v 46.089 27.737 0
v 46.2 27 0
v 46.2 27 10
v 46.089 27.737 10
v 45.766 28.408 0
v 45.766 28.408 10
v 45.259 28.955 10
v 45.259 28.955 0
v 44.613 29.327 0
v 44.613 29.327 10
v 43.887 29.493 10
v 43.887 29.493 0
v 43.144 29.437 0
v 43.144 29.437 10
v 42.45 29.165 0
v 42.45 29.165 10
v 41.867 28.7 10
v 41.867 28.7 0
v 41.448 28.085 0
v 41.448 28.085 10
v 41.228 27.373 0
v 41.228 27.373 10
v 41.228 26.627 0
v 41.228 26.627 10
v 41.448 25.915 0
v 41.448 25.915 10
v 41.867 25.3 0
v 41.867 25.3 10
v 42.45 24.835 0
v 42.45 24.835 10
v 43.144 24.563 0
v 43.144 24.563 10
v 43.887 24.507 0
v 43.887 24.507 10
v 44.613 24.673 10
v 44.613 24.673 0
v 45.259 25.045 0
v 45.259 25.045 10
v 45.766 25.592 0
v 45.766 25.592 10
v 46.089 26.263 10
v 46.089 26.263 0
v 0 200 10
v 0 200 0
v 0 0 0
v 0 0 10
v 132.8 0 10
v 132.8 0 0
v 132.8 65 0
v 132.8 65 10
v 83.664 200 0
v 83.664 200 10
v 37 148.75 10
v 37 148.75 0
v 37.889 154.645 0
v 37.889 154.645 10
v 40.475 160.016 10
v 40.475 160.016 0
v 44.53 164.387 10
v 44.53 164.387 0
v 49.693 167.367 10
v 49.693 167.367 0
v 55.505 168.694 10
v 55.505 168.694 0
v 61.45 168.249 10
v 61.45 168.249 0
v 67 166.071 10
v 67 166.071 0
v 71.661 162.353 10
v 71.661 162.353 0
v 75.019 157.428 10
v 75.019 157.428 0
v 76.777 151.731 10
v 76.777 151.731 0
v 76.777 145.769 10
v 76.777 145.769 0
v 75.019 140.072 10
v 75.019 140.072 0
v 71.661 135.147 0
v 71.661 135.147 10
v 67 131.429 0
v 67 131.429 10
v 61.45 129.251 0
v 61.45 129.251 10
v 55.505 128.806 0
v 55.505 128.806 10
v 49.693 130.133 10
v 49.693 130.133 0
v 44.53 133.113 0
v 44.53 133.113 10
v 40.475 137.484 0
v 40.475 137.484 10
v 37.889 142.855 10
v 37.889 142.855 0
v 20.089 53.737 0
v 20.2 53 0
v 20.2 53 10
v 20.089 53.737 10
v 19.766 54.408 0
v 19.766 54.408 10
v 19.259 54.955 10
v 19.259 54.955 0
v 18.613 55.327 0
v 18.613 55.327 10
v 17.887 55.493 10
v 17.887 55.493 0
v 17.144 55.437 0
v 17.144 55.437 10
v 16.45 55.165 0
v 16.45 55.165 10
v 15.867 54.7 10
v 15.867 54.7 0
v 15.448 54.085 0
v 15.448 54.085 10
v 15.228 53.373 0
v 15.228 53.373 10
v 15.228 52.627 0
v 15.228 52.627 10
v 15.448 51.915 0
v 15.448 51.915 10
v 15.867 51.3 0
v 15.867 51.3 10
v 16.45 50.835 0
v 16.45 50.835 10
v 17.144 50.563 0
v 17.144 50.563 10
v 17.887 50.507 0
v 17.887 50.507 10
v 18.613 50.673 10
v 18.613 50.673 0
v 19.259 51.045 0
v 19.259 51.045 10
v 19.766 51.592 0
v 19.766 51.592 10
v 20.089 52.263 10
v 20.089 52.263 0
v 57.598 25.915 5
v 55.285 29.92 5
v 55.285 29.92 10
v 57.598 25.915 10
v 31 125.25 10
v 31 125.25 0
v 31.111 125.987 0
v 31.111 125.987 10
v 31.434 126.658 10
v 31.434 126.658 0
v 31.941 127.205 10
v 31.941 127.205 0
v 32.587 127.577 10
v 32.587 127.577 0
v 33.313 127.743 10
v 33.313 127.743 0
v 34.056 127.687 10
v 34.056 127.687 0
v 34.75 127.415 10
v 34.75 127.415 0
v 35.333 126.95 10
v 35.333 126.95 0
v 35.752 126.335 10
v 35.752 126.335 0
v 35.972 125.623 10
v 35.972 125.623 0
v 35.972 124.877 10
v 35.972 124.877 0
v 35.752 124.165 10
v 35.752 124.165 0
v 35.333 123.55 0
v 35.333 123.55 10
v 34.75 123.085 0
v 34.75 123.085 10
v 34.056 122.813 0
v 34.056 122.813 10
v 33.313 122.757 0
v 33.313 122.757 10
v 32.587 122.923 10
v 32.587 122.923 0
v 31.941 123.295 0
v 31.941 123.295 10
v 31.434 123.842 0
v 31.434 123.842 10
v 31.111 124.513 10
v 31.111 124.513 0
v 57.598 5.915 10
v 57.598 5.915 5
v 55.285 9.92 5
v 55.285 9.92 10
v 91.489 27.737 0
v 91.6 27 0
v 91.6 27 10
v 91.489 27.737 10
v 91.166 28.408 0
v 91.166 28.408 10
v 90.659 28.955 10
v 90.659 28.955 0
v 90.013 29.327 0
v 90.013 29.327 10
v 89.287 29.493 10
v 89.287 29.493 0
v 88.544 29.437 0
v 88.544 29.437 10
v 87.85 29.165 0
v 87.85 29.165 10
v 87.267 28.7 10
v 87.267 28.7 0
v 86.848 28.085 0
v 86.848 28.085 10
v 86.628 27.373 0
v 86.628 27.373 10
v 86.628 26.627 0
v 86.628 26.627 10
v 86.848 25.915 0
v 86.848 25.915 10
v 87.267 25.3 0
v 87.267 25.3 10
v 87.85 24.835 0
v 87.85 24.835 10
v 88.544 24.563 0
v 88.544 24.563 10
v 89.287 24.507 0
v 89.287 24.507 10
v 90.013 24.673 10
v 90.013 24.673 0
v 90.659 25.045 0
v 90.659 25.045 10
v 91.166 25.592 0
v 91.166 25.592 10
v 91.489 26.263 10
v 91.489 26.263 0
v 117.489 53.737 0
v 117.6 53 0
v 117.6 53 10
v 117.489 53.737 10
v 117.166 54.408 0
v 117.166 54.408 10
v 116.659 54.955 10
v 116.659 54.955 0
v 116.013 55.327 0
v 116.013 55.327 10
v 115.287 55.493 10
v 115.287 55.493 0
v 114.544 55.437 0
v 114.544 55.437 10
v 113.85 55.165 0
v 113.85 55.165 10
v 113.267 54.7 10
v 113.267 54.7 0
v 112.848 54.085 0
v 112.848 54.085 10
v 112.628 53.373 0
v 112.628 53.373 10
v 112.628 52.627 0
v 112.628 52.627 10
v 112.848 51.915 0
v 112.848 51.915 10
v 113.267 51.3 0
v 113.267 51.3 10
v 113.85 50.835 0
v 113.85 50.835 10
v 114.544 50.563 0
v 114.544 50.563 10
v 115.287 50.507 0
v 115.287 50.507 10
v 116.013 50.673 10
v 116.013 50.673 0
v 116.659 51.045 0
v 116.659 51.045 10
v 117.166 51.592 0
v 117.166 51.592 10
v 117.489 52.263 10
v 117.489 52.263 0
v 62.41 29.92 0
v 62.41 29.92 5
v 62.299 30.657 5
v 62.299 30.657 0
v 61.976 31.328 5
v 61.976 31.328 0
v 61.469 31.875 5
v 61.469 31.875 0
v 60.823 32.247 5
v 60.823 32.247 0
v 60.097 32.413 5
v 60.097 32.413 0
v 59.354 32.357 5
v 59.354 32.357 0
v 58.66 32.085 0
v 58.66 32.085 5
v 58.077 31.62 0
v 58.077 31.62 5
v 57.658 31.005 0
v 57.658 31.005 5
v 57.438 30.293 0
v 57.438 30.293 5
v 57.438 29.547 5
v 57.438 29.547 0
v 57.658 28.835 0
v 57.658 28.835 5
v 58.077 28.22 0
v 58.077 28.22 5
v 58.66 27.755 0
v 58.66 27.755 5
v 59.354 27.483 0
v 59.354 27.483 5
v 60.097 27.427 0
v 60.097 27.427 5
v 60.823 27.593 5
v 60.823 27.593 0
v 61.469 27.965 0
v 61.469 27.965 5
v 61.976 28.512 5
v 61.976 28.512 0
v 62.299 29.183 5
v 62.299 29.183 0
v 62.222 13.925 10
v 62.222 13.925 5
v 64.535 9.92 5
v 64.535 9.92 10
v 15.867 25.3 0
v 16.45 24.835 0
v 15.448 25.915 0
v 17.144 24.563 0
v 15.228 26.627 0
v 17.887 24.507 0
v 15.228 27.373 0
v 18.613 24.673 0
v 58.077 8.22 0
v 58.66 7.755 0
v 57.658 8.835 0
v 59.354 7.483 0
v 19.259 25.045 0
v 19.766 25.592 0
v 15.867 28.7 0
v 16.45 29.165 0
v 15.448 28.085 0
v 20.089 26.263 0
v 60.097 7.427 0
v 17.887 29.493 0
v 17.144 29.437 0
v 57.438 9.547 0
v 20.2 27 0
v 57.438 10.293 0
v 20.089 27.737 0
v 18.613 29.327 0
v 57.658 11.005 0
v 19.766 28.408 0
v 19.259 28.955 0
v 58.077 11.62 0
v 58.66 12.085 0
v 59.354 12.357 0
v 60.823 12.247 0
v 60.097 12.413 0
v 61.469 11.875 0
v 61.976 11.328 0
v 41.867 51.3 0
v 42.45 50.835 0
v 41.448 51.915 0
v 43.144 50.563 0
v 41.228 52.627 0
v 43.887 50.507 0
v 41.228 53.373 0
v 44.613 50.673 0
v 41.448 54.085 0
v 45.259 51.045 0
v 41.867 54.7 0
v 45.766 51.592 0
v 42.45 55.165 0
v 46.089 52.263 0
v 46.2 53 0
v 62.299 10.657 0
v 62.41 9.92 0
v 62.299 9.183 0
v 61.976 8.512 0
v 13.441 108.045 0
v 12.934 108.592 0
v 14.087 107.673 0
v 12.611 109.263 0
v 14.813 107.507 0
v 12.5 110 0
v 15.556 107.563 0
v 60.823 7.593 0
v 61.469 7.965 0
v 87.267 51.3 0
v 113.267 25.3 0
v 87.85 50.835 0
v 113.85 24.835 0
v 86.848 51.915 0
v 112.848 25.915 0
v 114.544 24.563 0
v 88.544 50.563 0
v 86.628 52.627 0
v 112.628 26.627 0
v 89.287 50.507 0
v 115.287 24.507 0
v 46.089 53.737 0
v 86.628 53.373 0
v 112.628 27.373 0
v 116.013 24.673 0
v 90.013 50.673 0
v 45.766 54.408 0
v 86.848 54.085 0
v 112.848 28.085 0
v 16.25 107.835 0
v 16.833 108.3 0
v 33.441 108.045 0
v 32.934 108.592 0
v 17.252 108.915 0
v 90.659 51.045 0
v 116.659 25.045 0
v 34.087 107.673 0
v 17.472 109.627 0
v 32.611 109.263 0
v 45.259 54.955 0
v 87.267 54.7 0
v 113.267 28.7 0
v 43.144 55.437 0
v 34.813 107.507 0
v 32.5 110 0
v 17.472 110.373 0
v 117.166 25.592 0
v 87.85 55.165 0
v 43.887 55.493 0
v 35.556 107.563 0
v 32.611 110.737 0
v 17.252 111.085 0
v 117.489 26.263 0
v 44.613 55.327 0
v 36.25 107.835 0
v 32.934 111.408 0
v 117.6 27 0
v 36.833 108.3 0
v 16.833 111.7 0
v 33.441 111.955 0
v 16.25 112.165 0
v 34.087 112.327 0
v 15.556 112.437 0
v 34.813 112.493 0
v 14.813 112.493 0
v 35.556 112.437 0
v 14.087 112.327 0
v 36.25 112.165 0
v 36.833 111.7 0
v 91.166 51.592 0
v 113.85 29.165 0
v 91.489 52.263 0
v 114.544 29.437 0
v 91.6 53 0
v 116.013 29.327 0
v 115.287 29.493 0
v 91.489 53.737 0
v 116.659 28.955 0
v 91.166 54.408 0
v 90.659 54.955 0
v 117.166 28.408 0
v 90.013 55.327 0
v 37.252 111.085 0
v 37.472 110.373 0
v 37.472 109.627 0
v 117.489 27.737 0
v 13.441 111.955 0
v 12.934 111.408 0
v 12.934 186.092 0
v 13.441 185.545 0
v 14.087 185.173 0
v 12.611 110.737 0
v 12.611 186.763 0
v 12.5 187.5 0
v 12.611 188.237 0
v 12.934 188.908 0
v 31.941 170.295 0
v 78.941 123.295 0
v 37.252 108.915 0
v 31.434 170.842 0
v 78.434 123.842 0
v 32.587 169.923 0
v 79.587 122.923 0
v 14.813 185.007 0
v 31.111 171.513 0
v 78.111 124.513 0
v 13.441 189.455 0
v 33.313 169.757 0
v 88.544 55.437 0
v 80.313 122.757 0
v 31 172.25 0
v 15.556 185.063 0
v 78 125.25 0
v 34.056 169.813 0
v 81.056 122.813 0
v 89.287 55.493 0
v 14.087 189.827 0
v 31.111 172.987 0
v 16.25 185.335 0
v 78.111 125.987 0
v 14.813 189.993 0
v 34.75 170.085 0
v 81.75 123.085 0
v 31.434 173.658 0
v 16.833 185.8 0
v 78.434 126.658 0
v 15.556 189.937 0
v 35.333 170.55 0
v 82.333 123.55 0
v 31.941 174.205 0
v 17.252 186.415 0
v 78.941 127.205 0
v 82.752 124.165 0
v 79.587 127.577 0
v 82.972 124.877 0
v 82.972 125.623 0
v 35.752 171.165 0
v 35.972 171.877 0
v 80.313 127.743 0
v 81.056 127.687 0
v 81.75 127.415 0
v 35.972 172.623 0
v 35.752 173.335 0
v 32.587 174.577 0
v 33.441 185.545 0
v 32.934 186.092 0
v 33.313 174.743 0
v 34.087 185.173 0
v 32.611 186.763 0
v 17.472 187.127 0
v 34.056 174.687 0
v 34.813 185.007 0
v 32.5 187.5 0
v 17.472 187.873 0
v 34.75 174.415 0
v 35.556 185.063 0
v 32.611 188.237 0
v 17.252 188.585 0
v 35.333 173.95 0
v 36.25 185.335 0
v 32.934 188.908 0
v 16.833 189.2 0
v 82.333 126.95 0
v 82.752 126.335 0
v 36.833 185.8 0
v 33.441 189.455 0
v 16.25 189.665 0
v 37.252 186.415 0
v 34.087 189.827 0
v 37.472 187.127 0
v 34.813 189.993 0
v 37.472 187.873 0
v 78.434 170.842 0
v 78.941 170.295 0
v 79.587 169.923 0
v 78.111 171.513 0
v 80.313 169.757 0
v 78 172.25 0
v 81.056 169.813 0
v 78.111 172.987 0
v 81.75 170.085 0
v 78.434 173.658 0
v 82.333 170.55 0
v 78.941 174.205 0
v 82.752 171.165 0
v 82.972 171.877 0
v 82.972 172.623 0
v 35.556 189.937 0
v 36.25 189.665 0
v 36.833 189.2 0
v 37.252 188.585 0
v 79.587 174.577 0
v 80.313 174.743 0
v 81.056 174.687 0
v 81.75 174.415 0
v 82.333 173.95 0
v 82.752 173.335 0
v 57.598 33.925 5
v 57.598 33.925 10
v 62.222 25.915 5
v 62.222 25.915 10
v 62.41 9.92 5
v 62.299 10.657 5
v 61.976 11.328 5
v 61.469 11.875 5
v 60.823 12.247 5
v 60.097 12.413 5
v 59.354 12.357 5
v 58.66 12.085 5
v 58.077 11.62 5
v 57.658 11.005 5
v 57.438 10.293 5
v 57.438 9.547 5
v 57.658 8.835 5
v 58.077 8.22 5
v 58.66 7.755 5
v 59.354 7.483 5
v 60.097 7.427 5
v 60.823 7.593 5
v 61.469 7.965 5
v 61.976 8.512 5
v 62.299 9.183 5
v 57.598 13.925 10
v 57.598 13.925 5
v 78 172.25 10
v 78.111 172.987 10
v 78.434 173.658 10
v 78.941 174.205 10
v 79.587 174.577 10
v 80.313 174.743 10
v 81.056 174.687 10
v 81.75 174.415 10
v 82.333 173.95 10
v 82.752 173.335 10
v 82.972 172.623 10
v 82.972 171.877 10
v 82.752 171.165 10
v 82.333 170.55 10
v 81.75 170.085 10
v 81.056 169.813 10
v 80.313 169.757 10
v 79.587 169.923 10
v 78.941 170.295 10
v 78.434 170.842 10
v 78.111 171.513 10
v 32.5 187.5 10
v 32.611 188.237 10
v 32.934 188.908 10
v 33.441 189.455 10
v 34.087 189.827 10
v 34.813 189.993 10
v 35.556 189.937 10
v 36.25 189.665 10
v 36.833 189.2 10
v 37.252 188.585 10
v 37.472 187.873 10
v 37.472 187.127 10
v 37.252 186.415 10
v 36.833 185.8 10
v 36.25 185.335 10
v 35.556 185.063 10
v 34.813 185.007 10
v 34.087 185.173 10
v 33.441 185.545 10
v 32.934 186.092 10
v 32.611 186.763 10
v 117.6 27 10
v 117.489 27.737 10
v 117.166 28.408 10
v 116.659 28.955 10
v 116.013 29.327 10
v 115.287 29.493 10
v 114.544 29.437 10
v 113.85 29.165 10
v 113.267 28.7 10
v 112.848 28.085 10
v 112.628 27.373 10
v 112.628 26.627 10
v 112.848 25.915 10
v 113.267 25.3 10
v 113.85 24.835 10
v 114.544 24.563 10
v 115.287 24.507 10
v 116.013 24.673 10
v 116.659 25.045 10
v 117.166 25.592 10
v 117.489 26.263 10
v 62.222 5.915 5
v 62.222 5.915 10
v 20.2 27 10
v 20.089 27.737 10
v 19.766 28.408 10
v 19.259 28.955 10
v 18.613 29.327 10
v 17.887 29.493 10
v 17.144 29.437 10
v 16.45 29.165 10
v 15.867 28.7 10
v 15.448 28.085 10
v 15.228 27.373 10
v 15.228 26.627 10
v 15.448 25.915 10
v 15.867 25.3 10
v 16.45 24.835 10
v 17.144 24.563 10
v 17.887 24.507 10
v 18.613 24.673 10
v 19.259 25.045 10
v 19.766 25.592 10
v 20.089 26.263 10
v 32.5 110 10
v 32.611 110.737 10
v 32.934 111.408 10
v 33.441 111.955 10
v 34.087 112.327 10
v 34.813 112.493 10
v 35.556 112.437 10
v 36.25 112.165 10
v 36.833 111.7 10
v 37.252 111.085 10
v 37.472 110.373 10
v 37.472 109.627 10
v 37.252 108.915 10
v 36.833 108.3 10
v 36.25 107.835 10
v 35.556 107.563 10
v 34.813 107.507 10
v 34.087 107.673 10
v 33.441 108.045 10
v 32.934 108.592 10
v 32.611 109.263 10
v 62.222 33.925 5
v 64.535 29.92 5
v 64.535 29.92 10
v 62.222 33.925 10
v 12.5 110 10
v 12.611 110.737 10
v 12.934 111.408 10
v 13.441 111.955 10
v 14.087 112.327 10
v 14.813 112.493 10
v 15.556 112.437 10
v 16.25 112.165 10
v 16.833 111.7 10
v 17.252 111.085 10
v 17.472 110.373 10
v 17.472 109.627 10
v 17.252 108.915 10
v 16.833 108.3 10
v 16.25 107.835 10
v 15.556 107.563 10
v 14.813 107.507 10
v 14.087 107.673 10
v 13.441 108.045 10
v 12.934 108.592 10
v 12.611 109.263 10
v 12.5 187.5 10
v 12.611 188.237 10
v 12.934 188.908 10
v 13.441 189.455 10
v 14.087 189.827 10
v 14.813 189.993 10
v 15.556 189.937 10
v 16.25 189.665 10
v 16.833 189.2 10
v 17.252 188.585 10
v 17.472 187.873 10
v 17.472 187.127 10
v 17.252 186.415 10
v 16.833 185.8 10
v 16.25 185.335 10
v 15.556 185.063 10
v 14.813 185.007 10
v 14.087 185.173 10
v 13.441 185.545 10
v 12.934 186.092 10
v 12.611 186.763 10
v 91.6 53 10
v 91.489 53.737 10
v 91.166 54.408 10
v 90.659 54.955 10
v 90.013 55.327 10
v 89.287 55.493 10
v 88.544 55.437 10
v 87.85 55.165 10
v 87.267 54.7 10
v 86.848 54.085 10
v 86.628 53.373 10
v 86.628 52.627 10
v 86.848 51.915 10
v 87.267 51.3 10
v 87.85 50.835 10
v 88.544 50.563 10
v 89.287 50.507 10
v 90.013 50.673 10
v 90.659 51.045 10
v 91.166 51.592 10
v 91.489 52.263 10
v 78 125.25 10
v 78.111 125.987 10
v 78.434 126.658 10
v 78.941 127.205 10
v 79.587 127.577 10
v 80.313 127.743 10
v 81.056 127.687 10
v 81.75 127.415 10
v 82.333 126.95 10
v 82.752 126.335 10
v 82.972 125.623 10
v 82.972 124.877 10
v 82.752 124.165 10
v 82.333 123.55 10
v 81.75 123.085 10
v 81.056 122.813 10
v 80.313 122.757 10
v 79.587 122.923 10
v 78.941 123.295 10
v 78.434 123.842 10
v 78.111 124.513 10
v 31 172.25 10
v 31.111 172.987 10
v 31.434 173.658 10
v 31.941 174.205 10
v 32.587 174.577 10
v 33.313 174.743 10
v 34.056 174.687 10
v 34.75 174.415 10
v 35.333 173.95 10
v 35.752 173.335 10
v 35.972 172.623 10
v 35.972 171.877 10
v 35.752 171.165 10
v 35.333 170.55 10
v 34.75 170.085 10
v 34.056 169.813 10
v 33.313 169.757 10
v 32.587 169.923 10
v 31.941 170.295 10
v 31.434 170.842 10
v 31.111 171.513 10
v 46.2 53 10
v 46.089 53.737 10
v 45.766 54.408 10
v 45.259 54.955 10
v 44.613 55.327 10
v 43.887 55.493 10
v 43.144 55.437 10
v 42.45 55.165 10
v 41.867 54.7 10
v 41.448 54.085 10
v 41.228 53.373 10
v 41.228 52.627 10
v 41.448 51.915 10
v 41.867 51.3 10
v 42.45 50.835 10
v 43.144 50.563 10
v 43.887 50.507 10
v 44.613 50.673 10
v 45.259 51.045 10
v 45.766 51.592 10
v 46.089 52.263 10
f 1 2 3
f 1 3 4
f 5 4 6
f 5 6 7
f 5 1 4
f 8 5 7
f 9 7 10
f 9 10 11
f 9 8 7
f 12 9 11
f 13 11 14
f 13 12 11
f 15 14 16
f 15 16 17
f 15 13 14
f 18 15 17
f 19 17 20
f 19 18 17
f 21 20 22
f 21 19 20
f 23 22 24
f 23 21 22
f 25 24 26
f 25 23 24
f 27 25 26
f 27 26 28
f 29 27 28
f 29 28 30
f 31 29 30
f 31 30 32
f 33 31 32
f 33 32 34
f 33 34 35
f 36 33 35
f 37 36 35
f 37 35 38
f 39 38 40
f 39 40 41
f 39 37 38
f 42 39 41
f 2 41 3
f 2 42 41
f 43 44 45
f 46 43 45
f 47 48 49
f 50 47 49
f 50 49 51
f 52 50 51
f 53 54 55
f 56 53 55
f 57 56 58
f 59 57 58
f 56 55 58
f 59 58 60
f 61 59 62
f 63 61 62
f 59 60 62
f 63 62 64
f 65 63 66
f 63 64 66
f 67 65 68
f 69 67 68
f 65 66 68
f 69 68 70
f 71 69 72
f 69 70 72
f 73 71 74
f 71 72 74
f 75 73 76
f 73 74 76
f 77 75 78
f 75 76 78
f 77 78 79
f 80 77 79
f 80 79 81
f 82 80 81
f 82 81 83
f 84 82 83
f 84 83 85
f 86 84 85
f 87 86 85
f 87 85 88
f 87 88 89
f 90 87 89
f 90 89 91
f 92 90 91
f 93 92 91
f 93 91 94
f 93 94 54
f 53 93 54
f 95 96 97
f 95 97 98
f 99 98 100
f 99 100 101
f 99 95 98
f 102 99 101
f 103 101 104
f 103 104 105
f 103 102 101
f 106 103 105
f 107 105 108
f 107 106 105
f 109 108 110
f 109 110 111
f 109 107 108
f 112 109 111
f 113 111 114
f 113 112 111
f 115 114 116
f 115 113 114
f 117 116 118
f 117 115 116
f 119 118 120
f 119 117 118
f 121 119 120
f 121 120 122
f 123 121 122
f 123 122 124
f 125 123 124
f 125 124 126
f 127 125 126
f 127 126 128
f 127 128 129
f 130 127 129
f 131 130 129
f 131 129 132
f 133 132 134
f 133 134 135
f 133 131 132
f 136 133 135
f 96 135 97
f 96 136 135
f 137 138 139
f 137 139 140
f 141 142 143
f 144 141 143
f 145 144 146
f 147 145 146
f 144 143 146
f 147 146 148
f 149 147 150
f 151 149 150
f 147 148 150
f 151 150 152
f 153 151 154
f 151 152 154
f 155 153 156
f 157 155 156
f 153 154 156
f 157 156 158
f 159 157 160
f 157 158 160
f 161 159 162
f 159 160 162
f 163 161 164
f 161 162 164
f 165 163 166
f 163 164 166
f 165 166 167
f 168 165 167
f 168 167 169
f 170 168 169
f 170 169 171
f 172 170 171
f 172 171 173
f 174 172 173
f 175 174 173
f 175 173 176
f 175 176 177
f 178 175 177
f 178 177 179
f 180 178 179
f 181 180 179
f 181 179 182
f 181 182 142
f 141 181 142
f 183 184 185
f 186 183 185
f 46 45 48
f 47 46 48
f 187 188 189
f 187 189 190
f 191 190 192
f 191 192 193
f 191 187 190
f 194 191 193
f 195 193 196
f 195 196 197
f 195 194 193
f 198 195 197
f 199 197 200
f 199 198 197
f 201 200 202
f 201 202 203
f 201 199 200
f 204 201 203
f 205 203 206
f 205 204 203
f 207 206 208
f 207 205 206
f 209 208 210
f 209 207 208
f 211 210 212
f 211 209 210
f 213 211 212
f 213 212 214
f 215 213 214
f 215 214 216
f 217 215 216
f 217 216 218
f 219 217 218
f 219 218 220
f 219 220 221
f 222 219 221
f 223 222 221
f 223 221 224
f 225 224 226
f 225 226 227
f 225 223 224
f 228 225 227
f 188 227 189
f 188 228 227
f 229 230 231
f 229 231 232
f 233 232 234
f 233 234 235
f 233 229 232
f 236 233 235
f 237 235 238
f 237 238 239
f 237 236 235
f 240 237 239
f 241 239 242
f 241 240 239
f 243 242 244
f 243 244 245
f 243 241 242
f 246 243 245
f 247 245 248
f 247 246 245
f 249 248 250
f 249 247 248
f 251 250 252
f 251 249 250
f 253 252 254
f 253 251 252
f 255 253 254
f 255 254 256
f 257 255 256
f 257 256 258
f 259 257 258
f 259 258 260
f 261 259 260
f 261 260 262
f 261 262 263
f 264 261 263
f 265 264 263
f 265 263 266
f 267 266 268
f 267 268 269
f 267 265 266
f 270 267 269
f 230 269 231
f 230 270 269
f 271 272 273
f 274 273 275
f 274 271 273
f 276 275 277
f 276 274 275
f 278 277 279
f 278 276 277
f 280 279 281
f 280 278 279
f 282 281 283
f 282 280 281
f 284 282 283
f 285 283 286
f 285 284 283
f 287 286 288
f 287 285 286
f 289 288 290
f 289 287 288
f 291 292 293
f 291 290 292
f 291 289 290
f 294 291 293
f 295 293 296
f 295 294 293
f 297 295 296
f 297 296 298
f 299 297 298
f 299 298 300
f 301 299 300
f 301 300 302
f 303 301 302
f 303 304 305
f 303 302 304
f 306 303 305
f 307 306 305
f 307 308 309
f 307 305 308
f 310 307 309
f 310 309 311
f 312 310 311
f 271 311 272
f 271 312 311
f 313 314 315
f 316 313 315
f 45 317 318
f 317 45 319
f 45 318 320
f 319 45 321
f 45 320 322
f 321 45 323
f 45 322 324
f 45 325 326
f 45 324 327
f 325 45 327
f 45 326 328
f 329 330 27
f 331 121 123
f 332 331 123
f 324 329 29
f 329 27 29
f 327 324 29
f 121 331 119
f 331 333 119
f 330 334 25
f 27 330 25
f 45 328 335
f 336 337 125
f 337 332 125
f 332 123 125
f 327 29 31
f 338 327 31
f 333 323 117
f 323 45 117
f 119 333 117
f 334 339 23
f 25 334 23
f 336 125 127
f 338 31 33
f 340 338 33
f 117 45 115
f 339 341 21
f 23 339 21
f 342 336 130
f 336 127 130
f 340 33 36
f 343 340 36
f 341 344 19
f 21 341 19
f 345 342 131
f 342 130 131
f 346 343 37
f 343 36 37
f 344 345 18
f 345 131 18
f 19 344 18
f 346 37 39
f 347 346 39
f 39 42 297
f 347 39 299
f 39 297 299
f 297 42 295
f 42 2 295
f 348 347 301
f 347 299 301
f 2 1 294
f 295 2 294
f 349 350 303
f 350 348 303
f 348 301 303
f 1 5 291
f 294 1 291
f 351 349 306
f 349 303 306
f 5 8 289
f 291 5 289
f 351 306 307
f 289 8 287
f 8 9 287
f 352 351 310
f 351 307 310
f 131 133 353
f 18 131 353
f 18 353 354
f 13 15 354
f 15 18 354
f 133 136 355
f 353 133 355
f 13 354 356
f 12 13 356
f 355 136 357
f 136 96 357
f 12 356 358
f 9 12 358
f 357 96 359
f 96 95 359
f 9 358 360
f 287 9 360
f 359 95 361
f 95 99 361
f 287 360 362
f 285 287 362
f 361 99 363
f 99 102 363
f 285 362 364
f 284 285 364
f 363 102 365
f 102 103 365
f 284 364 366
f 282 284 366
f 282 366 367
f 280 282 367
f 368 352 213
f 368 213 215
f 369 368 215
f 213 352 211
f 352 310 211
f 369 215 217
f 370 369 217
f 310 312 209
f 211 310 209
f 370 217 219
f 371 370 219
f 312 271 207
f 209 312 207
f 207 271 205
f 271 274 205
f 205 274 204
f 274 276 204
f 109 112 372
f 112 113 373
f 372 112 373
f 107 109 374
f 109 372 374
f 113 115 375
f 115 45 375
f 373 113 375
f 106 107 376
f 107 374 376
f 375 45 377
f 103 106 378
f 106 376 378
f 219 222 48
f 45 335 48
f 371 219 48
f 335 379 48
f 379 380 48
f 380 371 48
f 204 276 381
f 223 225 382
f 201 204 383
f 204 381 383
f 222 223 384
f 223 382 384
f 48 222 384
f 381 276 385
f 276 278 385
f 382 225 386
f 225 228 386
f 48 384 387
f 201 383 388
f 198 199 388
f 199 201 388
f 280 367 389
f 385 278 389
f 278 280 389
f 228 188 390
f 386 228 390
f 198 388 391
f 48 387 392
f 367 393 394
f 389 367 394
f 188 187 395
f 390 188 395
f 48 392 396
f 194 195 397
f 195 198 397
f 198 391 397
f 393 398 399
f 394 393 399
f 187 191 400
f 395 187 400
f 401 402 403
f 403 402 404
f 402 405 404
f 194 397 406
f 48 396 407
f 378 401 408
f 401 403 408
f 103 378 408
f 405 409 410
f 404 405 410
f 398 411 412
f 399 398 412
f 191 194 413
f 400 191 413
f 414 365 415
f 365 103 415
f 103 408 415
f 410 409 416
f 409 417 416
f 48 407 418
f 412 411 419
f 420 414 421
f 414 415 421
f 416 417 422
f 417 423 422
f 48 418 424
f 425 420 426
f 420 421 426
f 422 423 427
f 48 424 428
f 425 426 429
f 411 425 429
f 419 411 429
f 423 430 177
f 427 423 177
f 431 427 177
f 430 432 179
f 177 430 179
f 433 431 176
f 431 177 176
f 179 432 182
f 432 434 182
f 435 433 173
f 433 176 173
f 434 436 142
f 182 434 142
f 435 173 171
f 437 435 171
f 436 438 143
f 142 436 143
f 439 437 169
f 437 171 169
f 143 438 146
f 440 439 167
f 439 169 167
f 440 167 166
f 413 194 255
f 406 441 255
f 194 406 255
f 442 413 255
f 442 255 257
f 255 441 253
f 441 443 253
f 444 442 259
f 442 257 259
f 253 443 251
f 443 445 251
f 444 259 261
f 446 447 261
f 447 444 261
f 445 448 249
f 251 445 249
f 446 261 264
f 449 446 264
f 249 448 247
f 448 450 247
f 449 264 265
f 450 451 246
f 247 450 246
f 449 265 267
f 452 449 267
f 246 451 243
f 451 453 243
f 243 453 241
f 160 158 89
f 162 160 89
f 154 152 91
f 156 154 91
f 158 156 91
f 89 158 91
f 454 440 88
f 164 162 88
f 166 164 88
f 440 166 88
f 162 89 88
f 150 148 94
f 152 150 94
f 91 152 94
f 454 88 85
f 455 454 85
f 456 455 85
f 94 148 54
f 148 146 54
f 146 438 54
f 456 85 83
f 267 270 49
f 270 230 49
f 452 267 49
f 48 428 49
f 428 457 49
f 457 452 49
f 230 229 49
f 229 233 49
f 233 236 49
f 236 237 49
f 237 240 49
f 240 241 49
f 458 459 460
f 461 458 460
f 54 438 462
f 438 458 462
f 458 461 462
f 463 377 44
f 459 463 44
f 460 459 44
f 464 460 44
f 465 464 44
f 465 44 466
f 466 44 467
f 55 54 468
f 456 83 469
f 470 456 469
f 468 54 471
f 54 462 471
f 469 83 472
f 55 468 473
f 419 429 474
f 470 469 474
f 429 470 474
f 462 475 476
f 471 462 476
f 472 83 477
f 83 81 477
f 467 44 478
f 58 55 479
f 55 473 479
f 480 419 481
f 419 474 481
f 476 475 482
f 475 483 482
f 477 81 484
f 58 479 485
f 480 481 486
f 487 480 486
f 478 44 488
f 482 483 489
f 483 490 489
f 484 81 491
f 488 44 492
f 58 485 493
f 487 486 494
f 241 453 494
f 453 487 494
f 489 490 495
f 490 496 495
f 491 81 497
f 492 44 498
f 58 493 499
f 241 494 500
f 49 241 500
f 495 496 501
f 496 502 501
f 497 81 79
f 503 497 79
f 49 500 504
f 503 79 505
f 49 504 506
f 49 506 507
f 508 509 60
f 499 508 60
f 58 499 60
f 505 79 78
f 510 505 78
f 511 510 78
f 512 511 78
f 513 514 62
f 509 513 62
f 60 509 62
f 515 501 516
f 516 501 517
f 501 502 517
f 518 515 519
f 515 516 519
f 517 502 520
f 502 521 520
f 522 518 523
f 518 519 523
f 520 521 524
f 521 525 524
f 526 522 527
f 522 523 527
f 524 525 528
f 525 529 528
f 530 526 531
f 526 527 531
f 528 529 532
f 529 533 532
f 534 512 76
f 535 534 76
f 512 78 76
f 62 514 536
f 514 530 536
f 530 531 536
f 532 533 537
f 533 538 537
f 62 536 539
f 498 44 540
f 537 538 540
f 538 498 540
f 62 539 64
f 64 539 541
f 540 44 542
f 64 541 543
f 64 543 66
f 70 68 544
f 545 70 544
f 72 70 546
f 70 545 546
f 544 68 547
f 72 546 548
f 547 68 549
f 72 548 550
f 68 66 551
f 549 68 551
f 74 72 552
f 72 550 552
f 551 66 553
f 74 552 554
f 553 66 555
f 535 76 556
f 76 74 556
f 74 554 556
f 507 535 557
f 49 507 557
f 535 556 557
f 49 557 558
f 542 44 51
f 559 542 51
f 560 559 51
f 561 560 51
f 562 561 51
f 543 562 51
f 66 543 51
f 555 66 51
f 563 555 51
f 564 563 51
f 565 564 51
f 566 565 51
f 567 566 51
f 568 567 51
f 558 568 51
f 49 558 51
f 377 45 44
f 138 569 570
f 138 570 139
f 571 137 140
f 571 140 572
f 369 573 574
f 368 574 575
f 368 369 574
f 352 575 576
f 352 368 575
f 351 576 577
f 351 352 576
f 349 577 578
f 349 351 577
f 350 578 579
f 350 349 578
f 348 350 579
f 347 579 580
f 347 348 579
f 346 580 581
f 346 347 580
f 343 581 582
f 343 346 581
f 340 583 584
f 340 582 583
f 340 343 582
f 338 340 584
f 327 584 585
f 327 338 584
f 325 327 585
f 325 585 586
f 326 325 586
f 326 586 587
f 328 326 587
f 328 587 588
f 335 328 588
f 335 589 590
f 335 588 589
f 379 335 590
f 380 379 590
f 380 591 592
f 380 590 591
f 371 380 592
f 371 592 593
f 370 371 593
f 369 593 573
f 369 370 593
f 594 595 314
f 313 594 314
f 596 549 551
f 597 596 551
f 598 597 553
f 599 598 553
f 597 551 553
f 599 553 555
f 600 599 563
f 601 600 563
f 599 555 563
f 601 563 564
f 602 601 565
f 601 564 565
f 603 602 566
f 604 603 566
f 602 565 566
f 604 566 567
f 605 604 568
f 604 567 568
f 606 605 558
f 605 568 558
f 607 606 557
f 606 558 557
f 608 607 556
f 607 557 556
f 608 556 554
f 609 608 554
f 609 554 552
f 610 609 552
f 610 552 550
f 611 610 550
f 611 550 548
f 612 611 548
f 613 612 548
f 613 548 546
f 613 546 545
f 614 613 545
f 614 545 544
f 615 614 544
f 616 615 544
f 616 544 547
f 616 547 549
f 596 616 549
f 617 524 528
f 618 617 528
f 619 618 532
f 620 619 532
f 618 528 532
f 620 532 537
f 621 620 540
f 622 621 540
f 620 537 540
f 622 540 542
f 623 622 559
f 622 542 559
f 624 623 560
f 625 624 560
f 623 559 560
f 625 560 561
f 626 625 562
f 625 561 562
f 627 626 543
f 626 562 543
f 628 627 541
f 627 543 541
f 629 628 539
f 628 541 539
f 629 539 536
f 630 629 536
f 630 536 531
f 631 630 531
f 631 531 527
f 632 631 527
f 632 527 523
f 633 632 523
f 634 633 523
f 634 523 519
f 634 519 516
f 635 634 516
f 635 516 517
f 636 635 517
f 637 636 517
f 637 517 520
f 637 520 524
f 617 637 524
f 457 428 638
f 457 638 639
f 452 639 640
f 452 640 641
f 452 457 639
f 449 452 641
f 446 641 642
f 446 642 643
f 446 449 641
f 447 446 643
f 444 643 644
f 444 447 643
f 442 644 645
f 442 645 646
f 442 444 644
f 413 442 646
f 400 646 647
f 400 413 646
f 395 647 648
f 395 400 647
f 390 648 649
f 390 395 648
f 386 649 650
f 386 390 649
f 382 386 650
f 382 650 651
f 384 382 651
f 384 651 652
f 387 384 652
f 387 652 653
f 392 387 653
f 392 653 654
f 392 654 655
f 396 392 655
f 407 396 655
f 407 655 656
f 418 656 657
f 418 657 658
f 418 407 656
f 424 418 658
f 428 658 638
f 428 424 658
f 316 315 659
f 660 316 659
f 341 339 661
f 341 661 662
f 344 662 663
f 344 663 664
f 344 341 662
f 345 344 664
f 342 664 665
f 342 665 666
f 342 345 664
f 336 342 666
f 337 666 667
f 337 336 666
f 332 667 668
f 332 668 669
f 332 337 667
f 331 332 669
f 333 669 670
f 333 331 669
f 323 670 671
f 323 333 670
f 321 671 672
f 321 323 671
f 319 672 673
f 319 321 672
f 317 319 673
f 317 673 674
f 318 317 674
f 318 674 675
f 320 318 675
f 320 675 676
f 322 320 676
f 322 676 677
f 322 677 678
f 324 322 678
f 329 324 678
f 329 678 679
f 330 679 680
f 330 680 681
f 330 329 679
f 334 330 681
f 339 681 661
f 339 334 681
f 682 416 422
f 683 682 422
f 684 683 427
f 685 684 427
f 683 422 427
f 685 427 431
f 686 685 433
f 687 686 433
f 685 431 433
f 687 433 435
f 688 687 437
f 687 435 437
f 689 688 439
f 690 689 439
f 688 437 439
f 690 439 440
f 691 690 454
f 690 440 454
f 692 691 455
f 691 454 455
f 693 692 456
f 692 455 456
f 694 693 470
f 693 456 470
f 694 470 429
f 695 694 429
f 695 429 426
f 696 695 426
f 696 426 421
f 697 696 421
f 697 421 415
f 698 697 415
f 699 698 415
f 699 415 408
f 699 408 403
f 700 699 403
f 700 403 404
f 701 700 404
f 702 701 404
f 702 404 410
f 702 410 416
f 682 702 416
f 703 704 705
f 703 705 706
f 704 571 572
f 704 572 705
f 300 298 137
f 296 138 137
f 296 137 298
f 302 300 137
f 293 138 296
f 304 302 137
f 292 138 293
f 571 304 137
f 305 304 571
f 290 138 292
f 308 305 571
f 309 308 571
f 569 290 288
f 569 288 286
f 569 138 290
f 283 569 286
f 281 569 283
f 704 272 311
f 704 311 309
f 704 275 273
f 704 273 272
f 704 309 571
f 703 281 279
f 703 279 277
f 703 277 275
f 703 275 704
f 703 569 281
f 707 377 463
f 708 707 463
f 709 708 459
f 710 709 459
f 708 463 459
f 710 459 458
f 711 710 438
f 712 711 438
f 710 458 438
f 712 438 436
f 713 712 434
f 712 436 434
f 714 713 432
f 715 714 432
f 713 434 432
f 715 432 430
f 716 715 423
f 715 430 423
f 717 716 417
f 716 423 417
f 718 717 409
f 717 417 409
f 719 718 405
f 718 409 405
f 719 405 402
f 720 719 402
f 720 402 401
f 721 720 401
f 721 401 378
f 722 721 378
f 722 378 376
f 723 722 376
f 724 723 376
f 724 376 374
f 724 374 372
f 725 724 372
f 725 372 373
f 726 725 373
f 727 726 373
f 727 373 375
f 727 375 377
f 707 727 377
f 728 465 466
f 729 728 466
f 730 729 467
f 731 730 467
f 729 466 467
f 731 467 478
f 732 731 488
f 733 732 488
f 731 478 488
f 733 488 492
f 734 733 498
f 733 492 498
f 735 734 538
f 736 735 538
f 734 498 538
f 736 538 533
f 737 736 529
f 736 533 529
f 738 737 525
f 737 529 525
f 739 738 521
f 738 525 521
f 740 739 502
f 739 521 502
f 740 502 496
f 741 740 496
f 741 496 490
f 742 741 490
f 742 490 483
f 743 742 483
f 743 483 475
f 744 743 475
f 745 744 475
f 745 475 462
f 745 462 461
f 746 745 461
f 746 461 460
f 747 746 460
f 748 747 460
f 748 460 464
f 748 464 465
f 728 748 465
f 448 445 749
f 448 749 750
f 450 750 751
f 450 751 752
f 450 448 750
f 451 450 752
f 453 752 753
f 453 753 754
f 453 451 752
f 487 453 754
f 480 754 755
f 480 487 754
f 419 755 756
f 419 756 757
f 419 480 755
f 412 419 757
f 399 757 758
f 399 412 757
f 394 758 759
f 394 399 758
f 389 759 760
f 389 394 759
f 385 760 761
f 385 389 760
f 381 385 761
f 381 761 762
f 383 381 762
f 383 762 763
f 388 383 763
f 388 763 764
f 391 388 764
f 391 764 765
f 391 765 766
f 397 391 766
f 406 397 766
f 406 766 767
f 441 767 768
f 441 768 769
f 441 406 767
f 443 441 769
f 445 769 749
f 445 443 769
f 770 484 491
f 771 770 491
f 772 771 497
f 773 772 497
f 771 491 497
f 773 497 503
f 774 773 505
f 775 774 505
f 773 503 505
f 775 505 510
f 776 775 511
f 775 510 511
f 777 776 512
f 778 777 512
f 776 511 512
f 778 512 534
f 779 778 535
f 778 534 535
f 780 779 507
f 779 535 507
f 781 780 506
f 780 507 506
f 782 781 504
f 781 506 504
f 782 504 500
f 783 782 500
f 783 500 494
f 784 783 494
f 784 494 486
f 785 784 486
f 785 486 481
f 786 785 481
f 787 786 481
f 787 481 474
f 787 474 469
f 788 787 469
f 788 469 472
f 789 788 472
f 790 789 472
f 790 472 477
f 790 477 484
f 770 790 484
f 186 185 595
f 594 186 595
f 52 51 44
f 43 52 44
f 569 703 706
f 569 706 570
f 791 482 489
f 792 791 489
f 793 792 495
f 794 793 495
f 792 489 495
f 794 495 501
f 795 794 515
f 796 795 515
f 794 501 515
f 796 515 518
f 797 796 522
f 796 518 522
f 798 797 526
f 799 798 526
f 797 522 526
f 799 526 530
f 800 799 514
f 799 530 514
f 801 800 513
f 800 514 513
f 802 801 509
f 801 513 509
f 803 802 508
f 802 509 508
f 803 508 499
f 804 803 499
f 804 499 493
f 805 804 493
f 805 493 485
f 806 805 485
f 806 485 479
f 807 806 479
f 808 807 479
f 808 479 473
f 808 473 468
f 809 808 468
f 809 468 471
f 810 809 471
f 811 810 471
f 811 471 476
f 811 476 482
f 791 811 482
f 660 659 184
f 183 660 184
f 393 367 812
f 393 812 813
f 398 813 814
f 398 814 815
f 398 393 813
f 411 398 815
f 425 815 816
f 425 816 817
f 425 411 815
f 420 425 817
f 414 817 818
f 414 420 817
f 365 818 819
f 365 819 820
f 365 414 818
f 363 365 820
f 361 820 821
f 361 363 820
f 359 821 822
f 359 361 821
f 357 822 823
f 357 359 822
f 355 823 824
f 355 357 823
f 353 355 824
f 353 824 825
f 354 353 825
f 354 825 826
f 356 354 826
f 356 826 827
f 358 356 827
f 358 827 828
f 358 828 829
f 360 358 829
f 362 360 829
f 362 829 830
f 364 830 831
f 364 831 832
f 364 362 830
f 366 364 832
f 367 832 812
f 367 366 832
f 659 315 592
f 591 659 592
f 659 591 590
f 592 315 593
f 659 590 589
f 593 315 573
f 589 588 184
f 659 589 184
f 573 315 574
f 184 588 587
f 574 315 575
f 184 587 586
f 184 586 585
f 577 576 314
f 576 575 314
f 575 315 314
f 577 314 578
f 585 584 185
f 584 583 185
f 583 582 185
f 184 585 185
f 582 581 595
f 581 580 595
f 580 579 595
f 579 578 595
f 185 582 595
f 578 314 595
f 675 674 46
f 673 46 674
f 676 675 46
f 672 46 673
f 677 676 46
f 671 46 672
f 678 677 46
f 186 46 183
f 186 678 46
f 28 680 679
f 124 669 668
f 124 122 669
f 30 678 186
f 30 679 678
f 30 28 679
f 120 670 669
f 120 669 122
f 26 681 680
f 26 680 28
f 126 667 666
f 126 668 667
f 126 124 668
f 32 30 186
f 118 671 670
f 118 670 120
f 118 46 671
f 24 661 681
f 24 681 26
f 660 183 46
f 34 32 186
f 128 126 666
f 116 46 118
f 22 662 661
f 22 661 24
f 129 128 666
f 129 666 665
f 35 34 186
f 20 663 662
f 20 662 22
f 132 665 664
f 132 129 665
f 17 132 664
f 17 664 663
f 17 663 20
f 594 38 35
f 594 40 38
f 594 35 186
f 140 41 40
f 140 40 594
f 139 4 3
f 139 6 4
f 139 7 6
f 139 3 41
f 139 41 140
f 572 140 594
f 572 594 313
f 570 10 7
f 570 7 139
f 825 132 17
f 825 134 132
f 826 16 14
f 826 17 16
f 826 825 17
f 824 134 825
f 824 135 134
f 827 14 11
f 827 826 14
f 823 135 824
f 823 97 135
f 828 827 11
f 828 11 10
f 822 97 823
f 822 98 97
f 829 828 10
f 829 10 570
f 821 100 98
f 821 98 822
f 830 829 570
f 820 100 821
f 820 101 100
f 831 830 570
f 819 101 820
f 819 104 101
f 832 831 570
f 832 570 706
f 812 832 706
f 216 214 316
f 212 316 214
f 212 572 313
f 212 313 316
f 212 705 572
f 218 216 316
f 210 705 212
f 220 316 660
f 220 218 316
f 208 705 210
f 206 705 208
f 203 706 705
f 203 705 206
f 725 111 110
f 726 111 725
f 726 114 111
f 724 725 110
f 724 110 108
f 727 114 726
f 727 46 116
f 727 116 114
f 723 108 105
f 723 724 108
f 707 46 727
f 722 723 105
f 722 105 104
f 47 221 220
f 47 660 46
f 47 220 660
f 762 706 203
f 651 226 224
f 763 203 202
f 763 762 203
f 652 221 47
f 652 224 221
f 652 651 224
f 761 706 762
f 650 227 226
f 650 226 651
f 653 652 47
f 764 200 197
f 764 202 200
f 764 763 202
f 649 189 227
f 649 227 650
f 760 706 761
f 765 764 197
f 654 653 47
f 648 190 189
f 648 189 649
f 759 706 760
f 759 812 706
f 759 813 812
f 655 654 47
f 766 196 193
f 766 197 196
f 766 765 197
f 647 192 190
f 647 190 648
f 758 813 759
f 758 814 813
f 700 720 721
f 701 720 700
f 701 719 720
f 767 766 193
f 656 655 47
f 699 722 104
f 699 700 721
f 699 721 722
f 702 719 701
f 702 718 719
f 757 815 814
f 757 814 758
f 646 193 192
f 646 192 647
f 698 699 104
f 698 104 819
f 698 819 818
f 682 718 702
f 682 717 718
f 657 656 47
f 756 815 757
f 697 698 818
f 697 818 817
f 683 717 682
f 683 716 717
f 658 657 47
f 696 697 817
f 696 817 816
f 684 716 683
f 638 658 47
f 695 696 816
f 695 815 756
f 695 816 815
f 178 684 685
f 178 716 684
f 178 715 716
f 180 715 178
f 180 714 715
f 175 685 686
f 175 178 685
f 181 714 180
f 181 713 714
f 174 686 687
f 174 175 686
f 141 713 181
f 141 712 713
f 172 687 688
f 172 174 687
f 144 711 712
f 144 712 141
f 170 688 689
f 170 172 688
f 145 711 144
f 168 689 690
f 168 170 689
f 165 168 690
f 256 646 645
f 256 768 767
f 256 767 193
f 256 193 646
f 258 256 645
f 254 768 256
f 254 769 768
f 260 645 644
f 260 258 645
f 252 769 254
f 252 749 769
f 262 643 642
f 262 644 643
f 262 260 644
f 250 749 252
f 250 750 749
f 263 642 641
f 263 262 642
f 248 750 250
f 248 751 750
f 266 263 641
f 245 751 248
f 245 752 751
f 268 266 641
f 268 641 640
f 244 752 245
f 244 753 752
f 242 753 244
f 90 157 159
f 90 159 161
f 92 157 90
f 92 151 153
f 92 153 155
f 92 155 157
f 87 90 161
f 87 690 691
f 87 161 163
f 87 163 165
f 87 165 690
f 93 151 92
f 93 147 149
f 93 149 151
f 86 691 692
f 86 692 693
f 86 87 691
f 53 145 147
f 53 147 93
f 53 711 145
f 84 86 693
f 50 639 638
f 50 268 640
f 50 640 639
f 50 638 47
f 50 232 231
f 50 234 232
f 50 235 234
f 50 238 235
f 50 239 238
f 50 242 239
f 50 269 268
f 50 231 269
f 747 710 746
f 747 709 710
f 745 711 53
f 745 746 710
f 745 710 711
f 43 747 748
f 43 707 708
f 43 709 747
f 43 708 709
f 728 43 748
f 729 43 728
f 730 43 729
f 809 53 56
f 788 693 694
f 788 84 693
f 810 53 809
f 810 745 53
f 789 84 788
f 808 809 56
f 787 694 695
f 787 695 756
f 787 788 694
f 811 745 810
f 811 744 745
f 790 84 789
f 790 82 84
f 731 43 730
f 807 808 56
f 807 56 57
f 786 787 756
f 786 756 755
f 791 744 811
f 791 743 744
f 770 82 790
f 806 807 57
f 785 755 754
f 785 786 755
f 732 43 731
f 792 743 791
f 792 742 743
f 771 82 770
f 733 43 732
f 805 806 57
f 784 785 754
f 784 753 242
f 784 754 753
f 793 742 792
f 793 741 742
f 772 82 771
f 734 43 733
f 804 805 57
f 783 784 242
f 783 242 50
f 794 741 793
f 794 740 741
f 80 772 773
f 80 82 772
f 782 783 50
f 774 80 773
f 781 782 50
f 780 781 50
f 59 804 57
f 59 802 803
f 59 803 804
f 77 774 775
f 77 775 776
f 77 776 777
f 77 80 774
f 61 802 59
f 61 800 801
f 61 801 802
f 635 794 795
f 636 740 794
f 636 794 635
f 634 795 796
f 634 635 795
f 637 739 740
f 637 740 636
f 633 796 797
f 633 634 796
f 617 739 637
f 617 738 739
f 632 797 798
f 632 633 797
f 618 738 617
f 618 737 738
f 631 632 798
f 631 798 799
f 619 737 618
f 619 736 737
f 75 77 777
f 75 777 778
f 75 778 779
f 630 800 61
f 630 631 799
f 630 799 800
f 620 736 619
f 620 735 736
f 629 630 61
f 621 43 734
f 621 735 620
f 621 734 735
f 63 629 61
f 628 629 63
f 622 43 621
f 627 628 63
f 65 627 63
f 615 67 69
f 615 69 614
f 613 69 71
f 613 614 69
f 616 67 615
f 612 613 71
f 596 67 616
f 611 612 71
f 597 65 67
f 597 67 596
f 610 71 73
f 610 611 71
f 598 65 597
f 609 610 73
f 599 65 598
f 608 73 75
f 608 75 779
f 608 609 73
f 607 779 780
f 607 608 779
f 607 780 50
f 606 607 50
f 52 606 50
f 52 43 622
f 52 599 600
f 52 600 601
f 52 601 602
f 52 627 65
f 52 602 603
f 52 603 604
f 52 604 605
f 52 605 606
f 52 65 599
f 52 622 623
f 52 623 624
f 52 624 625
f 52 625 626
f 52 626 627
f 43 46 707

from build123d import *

# Parameters (mm, degrees)
SKETCH1_R           = 2.5
BOSS_EXTRUDE1_DEPTH = 10
CUT_EXTRUDE1_START  = 5
SKETCH1_3_R         = 2.5
CUT_EXTRUDE1_DEPTH  = 5
SKETCH4_R           = 2.5
SKETCH4_R_2         = 20
CUT_EXTRUDE2_DEPTH  = 241.282833344


with BuildPart() as part:
    # Sketch1 → Boss-Extrude1 (new body)
    with BuildSketch(Plane.XY):
        Polygon((0, 200), (0, 0), (132.8, 0), (132.8, 65), (83.664018374, 200), align=None)
        with Locations((17.7, 27)):
            Circle(SKETCH1_R, mode=Mode.SUBTRACT)
        with Locations((43.7, 27)):
            Circle(SKETCH1_R, mode=Mode.SUBTRACT)
        with Locations((17.7, 53)):
            Circle(SKETCH1_R, mode=Mode.SUBTRACT)
        with Locations((43.7, 53)):
            Circle(SKETCH1_R, mode=Mode.SUBTRACT)
        with Locations((89.1, 27)):
            Circle(SKETCH1_R, mode=Mode.SUBTRACT)
        with Locations((115.1, 27)):
            Circle(SKETCH1_R, mode=Mode.SUBTRACT)
        with Locations((89.1, 53)):
            Circle(SKETCH1_R, mode=Mode.SUBTRACT)
        with Locations((115.1, 53)):
            Circle(SKETCH1_R, mode=Mode.SUBTRACT)
        with Locations((59.91, 9.92)):
            Circle(SKETCH1_R, mode=Mode.SUBTRACT)
        with Locations((59.91, 29.92)):
            Circle(SKETCH1_R, mode=Mode.SUBTRACT)
    extrude(amount=BOSS_EXTRUDE1_DEPTH)

    # Sketch1<3> → Cut-Extrude1 (cut)
    # profile 1 of 2: a face of its own
    with BuildSketch(Plane.XY.offset(CUT_EXTRUDE1_START)):
        Polygon((62.2225, 25.914632507), (64.535, 29.92), (62.2225, 33.925367493), (57.5975, 33.925367493), (55.285, 29.92), (57.5975, 25.914632507), align=None)
        with Locations((59.91, 29.92)):
            Circle(SKETCH1_3_R, mode=Mode.SUBTRACT)
    # profile 2 of 2: a face of its own
    with BuildSketch(Plane.XY.offset(CUT_EXTRUDE1_START)):
        Polygon((64.535, 9.92), (62.2225, 13.925367493), (57.5975, 13.925367493), (55.285, 9.92), (57.5975, 5.914632507), (62.2225, 5.914632507), align=None)
        with Locations((59.91, 9.92)):
            Circle(SKETCH1_3_R, mode=Mode.SUBTRACT)
    extrude(amount=CUT_EXTRUDE1_DEPTH, mode=Mode.SUBTRACT)

    # Sketch4 → Cut-Extrude2 (cut, through all)
    with BuildSketch(Plane(origin=(0, 0, 0), x_dir=(-1, 0, 0), z_dir=(0, 0, -1))):
        with Locations((-15, 187.5)):
            Circle(SKETCH4_R)
        with Locations((-35, 187.5)):
            Circle(SKETCH4_R)
        with Locations((-35, 110)):
            Circle(SKETCH4_R)
        with Locations((-15, 110)):
            Circle(SKETCH4_R)
        with Locations((-57, 148.75)):
            Circle(SKETCH4_R_2)
        with Locations((-33.5, 172.25)):
            Circle(SKETCH4_R)
        with Locations((-33.5, 125.25)):
            Circle(SKETCH4_R)
        with Locations((-80.5, 125.25)):
            Circle(SKETCH4_R)
        with Locations((-80.5, 172.25)):
            Circle(SKETCH4_R)
    extrude(amount=-CUT_EXTRUDE2_DEPTH, mode=Mode.SUBTRACT)


solid = part.part
